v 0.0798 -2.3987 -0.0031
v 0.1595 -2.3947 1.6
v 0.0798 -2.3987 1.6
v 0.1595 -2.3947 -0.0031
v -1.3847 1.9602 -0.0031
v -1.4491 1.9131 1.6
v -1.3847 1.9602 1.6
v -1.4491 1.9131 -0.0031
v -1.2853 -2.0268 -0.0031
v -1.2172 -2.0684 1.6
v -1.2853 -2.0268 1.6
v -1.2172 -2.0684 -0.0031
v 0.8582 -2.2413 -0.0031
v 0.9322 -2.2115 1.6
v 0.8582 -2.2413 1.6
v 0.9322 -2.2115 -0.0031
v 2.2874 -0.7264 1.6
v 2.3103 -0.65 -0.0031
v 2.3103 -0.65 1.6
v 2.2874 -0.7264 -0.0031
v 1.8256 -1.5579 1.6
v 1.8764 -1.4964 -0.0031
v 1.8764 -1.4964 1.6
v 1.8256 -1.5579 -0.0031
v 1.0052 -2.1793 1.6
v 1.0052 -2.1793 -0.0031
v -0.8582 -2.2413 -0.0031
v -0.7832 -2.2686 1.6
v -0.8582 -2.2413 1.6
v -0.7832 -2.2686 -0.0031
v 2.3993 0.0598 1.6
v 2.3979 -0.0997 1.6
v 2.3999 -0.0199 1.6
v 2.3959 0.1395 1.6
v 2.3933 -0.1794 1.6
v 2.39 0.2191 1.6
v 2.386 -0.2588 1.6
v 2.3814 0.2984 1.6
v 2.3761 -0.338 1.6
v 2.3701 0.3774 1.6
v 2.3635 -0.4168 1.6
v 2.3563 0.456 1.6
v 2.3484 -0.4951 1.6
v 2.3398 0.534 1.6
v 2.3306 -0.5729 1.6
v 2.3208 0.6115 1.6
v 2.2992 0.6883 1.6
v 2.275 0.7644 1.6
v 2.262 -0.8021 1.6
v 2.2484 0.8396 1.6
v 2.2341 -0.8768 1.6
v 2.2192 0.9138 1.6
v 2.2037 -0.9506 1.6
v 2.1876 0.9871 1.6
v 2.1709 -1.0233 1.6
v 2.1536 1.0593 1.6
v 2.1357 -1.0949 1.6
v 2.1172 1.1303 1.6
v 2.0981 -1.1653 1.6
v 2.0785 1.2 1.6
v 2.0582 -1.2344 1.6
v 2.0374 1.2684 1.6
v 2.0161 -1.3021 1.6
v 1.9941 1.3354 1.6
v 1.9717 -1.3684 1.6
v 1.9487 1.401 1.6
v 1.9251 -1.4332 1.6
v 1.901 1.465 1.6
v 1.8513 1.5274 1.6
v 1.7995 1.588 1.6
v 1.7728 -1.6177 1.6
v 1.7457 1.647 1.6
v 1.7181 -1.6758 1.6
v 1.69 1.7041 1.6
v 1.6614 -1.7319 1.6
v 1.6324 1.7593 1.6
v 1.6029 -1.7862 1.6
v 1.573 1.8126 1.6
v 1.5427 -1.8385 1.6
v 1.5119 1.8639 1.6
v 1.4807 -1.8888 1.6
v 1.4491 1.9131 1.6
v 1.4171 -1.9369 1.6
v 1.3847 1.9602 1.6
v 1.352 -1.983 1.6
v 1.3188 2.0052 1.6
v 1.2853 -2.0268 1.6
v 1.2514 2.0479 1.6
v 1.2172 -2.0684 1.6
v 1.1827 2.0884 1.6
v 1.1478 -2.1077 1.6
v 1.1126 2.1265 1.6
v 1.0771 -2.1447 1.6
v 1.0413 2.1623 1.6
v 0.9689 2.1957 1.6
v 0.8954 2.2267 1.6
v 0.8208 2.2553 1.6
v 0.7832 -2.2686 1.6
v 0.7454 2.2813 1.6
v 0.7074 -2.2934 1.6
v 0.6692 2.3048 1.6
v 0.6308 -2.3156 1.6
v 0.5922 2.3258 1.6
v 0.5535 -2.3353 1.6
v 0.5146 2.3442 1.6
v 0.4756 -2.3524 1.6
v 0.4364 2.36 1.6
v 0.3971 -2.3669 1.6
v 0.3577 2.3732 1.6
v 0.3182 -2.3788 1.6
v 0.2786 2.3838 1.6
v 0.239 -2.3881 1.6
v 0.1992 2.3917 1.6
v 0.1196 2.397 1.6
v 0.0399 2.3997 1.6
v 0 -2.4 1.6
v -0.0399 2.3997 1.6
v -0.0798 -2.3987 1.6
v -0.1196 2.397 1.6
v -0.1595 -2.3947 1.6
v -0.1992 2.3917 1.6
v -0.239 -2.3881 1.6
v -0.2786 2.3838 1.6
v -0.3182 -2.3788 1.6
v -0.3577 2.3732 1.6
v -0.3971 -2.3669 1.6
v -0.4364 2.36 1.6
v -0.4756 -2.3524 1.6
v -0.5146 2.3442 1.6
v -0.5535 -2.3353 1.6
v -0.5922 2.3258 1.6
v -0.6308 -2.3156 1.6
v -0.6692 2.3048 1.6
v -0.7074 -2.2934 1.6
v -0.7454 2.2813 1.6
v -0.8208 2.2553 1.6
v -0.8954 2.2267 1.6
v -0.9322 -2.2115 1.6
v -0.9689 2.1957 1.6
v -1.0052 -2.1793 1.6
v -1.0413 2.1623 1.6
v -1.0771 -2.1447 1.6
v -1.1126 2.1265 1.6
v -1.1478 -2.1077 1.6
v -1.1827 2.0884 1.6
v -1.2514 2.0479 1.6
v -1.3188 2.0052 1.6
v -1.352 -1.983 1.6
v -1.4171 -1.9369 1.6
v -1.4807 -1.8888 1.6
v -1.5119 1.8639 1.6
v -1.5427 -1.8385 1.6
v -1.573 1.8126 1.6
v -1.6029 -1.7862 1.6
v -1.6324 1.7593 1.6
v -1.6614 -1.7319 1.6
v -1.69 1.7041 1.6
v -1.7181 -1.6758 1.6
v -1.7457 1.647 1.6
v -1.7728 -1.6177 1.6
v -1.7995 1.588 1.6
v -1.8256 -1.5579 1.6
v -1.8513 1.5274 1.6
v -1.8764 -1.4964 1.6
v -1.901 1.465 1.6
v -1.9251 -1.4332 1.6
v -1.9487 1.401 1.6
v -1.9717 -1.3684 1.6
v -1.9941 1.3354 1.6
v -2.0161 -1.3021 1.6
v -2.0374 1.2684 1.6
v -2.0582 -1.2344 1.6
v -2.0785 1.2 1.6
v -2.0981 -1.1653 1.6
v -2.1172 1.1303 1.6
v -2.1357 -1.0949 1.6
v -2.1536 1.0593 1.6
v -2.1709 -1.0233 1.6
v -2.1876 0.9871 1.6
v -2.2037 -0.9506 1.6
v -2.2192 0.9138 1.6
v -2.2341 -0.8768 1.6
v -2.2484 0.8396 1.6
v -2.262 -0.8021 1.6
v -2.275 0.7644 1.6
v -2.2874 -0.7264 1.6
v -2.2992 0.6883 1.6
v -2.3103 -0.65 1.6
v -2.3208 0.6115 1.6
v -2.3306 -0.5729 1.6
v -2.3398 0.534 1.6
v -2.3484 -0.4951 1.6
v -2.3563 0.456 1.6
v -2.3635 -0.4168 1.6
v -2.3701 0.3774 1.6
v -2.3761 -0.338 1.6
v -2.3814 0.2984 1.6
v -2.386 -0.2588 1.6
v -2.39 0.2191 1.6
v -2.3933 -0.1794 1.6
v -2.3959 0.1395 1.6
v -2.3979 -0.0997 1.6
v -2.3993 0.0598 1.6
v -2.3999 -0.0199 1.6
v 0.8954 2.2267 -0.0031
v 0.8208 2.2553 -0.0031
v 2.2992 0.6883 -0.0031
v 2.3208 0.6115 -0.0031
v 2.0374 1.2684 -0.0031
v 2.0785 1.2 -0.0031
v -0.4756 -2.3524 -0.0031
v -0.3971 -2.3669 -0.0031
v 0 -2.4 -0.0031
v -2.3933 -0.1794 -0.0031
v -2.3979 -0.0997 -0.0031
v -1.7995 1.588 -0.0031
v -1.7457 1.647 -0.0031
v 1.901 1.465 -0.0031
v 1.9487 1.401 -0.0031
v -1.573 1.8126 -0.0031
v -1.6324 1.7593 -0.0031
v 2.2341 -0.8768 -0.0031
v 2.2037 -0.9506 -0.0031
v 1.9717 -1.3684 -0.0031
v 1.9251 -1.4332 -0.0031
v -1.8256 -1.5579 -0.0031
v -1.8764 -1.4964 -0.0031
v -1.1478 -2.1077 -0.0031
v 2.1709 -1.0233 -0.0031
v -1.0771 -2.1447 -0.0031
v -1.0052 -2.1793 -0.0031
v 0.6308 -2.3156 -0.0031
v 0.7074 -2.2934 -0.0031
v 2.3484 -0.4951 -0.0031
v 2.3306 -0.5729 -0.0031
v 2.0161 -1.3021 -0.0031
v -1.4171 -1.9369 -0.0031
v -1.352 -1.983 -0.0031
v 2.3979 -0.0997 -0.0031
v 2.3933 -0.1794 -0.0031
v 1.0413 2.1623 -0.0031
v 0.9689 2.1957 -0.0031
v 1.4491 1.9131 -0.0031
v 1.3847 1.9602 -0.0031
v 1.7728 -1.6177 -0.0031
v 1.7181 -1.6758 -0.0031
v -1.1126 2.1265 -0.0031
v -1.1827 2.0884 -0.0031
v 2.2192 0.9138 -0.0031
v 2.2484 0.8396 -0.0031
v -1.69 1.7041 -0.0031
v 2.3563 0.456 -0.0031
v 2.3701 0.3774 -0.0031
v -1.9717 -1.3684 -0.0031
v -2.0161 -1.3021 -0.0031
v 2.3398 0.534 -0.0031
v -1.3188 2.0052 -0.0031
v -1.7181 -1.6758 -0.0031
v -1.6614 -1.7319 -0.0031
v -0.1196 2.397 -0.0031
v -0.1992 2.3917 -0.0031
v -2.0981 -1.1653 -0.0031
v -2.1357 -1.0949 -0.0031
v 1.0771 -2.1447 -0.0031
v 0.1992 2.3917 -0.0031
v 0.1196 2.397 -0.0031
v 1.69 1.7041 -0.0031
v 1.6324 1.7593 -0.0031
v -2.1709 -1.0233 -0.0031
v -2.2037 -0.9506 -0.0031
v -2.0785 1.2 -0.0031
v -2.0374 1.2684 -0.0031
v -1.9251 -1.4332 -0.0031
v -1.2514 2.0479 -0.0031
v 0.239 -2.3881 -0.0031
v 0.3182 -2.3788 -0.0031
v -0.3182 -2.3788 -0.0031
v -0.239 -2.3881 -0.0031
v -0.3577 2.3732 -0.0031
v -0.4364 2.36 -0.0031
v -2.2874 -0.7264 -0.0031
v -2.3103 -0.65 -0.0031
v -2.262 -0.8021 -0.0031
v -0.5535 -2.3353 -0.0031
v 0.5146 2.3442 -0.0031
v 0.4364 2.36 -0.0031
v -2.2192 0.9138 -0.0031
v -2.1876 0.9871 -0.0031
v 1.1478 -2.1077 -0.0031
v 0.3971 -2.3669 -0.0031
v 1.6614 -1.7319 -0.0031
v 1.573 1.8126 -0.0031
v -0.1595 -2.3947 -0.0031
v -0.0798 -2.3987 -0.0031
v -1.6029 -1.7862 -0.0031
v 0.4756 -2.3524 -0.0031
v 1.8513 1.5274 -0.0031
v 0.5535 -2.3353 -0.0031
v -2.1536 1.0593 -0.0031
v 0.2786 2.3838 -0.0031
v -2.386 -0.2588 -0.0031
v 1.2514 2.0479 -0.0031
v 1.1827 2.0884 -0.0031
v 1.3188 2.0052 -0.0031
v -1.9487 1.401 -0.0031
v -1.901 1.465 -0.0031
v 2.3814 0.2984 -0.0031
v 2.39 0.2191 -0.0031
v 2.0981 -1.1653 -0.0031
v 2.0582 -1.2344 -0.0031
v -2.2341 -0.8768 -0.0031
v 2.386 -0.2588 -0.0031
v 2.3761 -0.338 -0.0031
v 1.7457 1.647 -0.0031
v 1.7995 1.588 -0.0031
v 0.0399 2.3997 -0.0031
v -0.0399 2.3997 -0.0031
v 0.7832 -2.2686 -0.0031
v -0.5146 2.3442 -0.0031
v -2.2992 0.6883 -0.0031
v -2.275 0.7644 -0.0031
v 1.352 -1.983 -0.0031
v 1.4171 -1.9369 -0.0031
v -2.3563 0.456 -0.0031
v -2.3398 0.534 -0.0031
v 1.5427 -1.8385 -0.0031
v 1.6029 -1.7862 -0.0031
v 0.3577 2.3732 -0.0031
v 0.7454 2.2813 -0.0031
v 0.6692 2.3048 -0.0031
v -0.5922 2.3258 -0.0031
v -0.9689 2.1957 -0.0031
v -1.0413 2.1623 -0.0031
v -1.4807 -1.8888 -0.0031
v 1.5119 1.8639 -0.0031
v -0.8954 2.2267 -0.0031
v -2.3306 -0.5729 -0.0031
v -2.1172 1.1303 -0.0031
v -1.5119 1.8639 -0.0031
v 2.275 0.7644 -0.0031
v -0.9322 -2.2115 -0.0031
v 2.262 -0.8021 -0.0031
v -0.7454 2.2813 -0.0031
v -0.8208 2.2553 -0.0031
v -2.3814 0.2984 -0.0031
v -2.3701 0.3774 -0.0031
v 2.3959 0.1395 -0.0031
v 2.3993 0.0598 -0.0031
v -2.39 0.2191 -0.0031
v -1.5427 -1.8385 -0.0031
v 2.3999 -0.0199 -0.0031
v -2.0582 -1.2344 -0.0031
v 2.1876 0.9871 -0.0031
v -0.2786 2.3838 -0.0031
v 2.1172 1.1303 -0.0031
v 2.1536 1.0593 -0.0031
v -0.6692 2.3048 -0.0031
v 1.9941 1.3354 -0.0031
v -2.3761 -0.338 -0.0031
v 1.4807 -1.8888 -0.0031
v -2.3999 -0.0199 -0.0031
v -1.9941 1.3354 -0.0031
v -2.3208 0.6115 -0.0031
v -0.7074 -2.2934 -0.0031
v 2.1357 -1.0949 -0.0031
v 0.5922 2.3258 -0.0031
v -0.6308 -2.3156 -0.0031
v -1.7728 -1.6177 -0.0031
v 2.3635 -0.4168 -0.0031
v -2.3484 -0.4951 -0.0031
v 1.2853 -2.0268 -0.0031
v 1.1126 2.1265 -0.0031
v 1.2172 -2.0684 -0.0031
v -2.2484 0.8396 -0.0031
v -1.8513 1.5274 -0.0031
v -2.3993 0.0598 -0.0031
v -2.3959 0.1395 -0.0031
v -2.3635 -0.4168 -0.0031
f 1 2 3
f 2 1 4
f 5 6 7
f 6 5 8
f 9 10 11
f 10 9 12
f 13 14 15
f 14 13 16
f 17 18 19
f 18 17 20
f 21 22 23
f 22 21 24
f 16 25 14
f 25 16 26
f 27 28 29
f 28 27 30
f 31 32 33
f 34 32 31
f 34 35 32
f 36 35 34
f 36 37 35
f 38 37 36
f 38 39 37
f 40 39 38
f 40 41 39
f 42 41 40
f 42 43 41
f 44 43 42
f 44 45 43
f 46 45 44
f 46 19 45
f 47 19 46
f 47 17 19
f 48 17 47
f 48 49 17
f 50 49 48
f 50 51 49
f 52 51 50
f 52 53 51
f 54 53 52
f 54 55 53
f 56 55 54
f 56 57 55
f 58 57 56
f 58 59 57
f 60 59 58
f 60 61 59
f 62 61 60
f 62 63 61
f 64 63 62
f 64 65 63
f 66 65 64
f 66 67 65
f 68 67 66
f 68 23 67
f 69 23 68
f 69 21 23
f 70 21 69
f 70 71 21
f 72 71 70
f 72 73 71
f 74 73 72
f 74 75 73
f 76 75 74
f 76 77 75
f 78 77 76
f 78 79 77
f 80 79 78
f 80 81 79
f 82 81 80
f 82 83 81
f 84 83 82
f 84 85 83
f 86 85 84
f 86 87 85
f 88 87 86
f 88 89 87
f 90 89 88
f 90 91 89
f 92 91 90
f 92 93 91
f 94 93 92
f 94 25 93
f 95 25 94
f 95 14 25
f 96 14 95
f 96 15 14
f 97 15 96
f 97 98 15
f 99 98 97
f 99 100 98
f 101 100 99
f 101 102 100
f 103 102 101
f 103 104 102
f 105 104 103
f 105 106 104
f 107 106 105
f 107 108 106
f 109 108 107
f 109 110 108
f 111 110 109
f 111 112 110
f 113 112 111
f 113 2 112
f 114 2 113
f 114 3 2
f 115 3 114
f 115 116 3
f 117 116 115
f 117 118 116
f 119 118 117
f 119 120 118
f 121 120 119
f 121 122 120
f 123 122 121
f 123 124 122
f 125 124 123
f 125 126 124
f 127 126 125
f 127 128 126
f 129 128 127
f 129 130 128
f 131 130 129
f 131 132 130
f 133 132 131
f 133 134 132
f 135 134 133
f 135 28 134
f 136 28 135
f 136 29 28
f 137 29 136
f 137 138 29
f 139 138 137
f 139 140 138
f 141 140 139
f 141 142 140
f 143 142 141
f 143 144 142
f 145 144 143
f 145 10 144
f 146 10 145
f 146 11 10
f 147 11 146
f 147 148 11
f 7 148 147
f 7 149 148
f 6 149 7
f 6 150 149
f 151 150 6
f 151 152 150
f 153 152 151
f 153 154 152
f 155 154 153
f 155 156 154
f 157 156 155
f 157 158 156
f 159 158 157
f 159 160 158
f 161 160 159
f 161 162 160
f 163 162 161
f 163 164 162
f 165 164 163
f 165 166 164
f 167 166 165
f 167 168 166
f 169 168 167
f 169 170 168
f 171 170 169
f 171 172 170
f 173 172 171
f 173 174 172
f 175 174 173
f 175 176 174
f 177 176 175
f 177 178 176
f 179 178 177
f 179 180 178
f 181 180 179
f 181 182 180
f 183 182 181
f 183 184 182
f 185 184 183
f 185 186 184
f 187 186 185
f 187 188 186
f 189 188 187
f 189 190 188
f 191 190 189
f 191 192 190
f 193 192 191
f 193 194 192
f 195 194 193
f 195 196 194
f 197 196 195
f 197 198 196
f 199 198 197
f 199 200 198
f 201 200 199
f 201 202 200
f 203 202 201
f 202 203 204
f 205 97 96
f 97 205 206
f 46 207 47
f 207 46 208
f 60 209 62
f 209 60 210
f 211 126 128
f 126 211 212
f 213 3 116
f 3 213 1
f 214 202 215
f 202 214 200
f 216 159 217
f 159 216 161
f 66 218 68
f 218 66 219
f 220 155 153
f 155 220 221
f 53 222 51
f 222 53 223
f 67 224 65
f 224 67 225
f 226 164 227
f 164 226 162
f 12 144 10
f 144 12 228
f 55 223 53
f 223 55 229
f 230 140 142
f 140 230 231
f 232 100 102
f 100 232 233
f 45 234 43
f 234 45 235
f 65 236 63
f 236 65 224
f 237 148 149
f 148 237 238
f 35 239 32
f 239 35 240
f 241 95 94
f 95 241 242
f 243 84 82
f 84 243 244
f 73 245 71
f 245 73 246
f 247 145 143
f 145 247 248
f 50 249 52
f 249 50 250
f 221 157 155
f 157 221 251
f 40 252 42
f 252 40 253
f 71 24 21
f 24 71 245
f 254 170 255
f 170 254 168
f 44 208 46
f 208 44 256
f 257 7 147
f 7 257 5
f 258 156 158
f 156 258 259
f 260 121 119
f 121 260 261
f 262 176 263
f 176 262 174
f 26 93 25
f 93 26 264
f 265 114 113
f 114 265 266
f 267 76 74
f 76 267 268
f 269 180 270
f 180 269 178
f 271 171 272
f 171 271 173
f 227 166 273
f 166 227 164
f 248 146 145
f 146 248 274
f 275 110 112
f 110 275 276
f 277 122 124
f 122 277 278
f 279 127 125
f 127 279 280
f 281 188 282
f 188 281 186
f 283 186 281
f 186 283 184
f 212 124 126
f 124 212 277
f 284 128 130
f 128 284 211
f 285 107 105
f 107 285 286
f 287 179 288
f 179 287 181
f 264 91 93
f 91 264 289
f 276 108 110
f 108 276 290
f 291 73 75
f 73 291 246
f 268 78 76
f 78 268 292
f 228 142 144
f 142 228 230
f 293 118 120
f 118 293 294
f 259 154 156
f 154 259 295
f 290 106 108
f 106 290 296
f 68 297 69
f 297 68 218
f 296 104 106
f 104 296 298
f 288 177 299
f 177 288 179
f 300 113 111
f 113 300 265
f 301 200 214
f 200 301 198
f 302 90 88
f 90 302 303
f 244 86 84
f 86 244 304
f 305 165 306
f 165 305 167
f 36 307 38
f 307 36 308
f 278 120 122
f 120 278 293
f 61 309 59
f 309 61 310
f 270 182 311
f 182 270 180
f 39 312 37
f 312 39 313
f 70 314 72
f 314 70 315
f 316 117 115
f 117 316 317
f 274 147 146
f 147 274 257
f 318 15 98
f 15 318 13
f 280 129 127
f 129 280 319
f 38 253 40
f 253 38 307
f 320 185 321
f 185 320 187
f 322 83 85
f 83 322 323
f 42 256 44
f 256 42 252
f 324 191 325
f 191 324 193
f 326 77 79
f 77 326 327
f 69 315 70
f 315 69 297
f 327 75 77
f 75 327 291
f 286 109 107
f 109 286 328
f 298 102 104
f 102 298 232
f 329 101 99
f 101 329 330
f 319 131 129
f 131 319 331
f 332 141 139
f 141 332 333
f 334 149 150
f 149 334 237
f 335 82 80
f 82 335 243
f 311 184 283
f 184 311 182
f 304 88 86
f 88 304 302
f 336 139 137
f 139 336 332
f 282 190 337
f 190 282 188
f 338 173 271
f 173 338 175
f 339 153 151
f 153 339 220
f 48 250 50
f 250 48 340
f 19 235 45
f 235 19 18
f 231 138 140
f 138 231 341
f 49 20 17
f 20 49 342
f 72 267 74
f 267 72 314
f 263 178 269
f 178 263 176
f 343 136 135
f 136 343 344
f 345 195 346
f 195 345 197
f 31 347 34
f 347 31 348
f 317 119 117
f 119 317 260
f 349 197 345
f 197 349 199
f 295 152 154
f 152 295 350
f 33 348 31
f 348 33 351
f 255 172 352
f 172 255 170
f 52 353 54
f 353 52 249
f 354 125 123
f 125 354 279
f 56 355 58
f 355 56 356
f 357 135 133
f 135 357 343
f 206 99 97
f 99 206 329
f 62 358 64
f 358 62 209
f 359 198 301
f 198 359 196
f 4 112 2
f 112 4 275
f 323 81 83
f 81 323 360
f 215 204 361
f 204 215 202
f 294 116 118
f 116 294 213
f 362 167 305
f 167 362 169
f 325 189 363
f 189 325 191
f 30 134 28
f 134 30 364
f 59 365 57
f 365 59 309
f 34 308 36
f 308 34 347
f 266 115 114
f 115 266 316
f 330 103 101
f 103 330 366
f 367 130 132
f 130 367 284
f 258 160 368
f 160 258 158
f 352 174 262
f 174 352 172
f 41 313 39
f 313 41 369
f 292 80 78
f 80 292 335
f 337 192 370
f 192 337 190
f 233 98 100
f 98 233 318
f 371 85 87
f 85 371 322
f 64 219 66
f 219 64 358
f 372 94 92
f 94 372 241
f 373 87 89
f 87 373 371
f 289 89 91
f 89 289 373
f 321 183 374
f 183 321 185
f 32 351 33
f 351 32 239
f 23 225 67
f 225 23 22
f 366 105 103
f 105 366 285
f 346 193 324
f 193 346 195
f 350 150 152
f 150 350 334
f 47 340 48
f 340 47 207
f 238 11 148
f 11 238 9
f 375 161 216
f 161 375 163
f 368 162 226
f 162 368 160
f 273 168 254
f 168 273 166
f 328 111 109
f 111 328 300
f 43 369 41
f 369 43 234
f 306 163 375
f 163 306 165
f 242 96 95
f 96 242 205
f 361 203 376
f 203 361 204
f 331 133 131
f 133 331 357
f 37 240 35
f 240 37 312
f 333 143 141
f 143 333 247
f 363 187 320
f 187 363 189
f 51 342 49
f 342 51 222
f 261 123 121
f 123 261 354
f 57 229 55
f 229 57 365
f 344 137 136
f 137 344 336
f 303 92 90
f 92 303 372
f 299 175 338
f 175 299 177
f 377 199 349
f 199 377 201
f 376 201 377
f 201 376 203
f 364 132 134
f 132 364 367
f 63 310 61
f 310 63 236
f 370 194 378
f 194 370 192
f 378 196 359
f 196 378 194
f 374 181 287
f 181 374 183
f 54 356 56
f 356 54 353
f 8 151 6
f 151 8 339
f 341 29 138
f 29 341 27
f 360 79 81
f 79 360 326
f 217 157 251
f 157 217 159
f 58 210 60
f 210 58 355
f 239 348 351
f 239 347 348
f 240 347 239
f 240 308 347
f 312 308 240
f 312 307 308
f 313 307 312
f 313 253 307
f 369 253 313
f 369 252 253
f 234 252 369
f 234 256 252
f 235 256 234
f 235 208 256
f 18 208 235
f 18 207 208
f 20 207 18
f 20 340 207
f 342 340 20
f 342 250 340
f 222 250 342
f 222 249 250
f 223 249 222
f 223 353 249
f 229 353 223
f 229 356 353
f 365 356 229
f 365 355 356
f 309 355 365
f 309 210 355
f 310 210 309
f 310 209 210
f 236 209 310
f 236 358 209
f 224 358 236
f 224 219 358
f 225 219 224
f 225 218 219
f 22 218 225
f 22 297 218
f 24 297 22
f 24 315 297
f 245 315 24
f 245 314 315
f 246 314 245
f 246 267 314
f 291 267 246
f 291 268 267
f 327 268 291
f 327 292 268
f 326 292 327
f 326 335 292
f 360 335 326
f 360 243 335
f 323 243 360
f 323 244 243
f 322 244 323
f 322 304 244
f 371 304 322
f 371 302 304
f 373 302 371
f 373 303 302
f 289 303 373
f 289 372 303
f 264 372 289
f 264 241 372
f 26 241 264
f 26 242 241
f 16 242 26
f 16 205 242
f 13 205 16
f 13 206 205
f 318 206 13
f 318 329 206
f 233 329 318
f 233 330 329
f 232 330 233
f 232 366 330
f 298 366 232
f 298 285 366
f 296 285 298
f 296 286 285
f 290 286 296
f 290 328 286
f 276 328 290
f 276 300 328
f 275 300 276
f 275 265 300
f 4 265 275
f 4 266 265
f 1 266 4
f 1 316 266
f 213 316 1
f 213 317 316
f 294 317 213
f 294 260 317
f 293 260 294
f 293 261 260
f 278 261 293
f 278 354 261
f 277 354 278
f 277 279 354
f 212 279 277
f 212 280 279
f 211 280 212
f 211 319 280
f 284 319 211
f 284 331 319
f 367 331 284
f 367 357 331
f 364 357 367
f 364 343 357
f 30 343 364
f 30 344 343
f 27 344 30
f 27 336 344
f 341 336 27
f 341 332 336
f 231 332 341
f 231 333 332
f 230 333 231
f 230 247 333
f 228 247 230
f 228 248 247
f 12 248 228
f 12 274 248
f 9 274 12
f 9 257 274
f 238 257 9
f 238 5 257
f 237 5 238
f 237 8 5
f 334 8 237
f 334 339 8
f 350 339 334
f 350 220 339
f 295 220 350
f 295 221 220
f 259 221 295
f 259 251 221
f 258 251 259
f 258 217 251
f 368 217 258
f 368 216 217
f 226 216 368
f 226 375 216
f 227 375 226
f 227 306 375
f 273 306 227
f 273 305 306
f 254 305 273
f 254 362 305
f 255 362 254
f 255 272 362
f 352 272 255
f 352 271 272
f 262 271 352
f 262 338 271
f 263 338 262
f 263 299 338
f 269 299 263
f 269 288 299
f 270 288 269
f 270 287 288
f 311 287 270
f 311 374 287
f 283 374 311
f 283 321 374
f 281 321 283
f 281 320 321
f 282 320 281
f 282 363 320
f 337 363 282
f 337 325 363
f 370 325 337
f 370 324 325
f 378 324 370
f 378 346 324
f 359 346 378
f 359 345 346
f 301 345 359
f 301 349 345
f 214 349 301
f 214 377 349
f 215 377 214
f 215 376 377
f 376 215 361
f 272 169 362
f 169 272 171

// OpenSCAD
use <../lib.scad>
use <3186.scad>
$fa=1; $fs=0.2;
function ldraw_lib__370(realsolid=false) = [
// 0 ~Moved to 3186
// 0 Name: 370.dat
// 0 Author: [PTadmin]
// 0 !LDRAW_ORG Part UPDATE 1998-06
// 0 !LICENSE Licensed under CC BY 4.0 : see CAreadme.txt
// 
// 0 BFC CERTIFY CCW
  [0,"BFC","CERTIFY"],
  [0,"BFC","CCW"],
// 
// 0 !HISTORY 1998-06-20 [PTadmin] Official Update 1998-06
// 0 !HISTORY 2007-06-29 [PTadmin] Header formatted for Contributor Agreement
// 0 !HISTORY 2008-07-01 [PTadmin] Official Update 2008-01
// 
// 
// 1 16 0 0 0 1 0 0 0 1 0 0 0 1 3186.dat
  [1,16,0,0,0,1,0,0,0,1,0,0,0,1, ldraw_lib__3186(realsolid)],
];
module ldraw_lib__370(step=0, col=false, unit=2/5, alt=false, line=0.2, solid=!$preview)
    makepoly(ldraw_lib__370(solid), step=step, col=col, unit=unit, alt=alt, line=line, solid=solid);
ldraw_lib__370(line=0.2);
